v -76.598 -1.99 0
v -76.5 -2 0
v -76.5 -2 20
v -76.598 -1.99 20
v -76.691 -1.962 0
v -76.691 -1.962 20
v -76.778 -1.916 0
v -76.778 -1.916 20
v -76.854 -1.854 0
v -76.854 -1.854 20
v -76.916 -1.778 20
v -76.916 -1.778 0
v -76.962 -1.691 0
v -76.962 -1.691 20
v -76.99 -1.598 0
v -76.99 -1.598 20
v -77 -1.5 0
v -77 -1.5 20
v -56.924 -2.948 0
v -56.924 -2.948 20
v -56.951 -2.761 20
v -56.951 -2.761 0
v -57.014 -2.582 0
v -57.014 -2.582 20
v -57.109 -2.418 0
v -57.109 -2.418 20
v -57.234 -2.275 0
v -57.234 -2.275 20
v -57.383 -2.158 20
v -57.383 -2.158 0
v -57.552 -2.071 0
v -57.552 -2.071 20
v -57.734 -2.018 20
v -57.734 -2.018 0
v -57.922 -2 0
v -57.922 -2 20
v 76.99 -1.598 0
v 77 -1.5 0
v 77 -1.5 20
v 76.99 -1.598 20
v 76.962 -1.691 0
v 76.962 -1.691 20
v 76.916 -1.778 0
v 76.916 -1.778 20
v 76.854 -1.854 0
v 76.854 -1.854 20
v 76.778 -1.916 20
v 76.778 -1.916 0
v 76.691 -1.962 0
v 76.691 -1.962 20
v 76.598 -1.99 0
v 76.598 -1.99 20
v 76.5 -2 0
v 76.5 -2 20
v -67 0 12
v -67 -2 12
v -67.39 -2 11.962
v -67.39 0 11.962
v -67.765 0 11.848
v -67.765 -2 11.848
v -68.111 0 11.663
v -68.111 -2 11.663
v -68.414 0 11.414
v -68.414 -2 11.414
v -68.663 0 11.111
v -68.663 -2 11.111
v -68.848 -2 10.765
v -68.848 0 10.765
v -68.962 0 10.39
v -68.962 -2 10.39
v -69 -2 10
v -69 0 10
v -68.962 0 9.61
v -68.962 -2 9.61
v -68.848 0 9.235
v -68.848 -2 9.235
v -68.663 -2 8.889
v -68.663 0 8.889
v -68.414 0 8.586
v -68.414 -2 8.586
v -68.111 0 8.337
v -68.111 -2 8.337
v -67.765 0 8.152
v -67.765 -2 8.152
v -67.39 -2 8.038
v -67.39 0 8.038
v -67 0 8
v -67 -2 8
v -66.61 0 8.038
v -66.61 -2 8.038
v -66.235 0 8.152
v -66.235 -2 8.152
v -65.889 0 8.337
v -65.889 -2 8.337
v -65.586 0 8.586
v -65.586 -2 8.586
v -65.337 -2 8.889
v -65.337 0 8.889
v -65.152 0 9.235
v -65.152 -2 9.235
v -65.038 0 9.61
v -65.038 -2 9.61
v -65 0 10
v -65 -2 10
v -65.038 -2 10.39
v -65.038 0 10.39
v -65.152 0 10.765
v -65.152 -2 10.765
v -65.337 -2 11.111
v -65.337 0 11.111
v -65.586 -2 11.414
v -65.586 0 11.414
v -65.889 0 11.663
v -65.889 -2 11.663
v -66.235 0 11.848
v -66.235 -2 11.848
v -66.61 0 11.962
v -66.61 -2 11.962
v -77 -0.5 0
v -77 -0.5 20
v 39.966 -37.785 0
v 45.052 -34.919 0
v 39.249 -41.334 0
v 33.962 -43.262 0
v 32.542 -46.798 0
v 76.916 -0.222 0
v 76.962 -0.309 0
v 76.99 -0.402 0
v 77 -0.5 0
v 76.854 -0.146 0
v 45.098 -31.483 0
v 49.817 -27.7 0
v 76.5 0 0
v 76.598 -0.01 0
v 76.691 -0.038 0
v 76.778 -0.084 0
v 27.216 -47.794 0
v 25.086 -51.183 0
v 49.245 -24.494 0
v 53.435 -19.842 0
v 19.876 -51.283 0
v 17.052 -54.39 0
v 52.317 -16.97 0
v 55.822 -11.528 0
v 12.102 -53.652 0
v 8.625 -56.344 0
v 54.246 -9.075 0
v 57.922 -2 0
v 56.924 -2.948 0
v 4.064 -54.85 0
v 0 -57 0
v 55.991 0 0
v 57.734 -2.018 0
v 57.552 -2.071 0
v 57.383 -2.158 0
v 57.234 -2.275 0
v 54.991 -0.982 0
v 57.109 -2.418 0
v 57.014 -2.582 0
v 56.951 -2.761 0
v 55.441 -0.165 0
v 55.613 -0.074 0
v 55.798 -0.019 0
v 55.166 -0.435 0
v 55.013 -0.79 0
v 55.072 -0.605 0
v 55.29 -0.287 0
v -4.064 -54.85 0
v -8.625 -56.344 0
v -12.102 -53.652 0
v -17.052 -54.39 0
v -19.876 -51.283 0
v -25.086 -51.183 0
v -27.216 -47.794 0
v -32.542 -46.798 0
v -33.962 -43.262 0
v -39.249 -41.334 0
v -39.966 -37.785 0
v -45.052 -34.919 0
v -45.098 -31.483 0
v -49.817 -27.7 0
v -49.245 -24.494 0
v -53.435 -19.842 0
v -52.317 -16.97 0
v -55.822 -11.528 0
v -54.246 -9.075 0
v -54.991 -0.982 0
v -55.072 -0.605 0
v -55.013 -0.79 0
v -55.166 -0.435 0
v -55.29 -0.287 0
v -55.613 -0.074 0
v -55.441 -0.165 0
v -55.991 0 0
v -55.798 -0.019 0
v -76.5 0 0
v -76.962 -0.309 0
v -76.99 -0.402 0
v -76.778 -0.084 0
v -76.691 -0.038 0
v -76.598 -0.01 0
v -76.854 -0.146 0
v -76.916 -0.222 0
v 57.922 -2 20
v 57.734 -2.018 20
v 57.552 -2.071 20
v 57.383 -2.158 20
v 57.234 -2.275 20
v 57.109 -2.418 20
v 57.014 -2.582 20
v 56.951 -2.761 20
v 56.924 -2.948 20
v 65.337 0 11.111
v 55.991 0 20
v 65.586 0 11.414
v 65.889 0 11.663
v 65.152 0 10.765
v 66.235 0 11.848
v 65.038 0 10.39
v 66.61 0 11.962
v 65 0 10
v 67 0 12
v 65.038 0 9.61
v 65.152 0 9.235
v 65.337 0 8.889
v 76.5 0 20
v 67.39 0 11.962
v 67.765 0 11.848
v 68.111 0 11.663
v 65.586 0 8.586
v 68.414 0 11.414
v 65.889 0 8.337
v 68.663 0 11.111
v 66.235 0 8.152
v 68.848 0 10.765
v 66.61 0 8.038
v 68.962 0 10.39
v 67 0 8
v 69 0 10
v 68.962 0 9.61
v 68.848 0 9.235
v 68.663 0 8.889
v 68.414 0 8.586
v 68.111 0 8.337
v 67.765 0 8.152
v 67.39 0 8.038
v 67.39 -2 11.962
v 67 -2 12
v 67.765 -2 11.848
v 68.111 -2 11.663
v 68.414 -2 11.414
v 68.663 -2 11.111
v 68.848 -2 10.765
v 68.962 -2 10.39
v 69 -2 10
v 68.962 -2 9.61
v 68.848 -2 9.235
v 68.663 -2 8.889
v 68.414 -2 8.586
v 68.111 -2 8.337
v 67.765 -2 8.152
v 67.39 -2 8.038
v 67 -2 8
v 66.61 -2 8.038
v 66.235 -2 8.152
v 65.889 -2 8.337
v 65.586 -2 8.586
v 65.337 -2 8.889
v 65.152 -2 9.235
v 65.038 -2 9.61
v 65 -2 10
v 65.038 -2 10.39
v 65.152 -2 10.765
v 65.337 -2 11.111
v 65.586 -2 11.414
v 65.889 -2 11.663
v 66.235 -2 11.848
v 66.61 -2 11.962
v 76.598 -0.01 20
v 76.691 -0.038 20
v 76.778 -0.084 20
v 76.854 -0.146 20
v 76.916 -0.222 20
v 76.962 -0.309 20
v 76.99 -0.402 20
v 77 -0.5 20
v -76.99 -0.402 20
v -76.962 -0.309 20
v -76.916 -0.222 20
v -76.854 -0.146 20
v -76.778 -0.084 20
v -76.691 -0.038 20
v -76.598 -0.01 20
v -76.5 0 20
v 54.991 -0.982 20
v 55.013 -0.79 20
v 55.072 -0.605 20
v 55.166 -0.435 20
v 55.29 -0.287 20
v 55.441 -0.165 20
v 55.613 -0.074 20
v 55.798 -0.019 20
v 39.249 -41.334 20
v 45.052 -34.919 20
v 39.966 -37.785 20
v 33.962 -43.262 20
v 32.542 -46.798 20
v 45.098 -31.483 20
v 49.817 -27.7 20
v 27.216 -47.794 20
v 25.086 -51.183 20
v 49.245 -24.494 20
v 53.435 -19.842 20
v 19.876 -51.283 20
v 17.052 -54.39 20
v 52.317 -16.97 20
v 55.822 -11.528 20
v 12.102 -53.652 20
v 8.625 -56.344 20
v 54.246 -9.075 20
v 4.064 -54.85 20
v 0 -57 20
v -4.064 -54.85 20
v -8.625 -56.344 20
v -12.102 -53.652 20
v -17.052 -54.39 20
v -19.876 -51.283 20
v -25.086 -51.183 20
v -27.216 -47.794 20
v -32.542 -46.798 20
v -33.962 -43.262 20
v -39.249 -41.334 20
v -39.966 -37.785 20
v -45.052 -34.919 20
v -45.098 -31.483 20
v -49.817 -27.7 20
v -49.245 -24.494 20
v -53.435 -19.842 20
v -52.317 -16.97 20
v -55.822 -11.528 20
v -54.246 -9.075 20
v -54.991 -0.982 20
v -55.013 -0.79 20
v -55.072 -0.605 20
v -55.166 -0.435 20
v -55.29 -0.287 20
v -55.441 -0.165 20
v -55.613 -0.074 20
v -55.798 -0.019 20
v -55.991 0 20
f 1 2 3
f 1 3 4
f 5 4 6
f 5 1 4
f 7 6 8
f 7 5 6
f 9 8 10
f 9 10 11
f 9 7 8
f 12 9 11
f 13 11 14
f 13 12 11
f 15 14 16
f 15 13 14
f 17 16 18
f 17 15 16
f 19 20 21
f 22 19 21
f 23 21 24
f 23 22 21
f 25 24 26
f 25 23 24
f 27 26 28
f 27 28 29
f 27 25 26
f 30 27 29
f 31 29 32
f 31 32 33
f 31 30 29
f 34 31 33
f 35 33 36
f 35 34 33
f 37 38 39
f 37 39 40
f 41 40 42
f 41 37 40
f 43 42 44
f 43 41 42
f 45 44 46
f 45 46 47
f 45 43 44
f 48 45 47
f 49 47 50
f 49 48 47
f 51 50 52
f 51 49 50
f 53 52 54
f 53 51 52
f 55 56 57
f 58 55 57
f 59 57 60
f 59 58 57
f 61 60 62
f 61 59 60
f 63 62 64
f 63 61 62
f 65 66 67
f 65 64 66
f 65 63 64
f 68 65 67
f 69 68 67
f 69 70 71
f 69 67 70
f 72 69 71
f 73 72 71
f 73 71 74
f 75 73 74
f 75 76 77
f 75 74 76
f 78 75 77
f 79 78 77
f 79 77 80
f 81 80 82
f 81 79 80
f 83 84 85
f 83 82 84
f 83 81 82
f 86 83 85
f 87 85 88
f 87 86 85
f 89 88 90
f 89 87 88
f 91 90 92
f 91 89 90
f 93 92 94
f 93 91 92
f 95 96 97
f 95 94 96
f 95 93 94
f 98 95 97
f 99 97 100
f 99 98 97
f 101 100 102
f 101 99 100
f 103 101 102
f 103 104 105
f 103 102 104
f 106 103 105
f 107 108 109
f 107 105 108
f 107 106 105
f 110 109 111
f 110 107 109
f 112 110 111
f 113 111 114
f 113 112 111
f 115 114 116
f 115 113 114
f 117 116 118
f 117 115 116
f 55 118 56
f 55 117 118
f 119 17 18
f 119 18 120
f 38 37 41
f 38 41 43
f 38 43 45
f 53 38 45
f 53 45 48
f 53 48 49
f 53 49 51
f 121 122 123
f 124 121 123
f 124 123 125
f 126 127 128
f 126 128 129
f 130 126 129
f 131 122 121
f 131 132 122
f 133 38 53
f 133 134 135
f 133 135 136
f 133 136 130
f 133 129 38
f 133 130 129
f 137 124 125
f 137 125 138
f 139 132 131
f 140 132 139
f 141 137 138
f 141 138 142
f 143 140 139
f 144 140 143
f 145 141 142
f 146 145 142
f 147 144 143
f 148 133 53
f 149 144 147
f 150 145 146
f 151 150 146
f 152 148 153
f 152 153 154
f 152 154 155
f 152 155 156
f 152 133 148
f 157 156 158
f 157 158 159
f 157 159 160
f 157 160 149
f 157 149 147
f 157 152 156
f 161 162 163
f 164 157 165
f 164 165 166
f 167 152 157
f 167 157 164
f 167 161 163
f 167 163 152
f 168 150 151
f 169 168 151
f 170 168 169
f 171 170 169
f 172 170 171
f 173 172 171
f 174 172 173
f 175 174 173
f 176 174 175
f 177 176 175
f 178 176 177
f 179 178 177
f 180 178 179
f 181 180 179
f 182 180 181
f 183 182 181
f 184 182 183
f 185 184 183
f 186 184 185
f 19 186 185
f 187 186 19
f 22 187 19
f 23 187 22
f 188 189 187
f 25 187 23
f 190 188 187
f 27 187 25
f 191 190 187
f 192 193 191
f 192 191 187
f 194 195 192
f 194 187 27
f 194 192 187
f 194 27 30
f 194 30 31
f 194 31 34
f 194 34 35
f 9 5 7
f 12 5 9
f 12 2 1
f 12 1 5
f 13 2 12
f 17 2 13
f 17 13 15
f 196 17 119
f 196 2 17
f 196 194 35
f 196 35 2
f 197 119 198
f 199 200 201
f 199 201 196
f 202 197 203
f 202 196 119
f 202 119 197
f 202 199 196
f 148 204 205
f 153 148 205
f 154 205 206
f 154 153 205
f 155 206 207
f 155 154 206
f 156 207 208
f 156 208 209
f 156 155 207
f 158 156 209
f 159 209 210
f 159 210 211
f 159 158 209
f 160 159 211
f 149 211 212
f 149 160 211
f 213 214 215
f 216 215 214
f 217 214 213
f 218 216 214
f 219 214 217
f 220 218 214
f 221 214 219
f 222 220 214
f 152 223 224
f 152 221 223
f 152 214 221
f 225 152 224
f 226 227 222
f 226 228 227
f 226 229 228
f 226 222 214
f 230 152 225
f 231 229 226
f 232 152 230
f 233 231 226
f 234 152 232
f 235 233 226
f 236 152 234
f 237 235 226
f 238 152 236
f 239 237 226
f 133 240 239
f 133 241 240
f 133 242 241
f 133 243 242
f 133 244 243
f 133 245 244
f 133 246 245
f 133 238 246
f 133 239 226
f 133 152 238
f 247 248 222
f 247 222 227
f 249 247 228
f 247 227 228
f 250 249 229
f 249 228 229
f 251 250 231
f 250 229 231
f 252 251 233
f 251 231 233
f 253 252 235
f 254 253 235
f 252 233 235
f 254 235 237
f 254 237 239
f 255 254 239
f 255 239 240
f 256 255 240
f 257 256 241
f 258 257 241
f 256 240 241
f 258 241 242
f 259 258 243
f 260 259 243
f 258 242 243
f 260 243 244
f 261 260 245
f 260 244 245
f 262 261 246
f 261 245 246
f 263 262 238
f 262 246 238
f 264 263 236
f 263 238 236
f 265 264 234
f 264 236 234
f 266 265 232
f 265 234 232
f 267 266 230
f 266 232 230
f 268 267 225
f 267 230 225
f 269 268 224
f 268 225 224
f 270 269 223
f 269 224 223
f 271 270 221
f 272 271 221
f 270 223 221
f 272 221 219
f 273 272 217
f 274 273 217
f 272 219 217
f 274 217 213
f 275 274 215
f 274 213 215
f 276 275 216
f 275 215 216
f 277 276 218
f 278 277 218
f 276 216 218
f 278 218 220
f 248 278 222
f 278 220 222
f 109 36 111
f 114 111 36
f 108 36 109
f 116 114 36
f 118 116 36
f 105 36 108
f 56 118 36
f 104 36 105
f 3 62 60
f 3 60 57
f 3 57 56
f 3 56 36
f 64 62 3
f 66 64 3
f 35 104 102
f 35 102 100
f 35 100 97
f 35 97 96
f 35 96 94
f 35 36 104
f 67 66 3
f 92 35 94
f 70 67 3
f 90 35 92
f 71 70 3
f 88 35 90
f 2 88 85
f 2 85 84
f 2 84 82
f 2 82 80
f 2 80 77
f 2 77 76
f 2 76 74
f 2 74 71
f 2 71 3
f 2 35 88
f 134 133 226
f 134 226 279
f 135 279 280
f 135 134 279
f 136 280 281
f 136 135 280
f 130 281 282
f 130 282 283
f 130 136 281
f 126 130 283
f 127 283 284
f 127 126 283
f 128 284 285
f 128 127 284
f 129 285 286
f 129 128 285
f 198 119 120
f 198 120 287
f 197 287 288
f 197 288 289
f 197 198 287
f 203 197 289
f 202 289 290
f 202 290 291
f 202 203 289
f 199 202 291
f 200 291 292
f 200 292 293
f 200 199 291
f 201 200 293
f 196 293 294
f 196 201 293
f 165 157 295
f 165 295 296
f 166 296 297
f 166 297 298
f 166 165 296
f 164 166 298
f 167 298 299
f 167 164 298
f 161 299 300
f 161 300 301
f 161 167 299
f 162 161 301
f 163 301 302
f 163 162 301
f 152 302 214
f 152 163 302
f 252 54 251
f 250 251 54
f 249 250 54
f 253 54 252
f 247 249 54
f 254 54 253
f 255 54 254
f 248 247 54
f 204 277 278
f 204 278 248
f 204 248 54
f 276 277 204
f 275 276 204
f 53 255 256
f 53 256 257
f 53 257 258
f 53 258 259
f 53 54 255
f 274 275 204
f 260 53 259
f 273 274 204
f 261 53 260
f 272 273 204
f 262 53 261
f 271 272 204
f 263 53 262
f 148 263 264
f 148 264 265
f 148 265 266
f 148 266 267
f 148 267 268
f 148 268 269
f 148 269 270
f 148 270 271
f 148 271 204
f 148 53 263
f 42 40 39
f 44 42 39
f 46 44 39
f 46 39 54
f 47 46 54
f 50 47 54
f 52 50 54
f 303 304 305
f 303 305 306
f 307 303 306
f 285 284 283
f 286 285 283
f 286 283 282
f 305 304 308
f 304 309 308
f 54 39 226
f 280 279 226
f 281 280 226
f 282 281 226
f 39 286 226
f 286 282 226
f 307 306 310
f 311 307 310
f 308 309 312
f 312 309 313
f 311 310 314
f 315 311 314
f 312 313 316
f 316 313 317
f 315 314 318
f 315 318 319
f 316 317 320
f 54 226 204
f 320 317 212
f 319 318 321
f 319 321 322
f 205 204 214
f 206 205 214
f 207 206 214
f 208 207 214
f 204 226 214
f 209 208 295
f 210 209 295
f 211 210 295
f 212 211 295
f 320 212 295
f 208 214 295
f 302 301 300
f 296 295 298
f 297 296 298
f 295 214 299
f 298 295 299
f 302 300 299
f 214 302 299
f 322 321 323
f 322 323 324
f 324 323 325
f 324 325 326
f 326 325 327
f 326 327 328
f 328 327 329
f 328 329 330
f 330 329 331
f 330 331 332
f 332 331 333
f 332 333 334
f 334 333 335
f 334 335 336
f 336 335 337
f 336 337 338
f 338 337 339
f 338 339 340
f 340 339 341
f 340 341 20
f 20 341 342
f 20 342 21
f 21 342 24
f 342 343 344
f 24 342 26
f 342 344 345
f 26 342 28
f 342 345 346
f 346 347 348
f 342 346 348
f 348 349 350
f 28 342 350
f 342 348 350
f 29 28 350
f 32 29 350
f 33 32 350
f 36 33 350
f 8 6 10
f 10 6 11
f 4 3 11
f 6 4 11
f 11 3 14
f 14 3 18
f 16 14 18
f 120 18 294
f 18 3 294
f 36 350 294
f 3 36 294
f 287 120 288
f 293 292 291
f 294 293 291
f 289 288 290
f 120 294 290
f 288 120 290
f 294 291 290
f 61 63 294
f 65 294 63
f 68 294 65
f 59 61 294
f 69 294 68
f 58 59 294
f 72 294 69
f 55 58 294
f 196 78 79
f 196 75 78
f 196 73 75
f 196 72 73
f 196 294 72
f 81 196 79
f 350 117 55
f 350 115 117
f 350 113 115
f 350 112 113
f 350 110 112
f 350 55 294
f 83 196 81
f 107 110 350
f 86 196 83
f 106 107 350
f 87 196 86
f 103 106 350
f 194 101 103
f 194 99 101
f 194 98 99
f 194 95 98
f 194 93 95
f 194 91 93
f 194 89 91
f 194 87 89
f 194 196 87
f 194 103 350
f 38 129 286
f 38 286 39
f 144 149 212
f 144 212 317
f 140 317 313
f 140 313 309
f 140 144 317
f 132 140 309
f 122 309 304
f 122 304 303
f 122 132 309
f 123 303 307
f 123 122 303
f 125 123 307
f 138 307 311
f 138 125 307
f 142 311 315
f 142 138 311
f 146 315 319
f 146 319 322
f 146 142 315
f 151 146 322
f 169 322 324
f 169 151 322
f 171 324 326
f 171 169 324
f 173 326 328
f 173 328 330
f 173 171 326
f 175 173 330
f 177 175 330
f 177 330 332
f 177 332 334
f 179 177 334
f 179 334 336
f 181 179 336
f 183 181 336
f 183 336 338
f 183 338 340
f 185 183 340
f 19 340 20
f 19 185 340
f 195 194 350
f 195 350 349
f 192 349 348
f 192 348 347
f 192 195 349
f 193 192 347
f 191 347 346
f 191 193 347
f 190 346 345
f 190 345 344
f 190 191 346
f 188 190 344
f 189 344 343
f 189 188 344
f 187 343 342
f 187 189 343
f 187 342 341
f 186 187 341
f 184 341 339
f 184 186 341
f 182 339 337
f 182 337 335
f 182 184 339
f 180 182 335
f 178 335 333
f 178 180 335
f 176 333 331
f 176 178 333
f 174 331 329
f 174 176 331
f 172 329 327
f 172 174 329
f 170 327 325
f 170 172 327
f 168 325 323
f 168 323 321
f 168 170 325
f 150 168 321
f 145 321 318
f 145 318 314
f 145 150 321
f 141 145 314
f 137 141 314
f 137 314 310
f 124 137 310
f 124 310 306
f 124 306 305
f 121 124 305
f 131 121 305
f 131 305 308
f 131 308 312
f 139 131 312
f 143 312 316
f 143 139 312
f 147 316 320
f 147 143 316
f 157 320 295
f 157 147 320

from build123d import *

# Parameters (mm, degrees)
SALIENTE_EXTRUIR2_DEPTH = 20
CROQUIS5_R              = 2
CORTAR_EXTRUIR2_DEPTH   = 98.867257037


with BuildPart() as part:
    # Croquis1 → Saliente-Extruir2 (new body)
    with BuildSketch(Plane.XY):
        with BuildLine():
            Line((-57, 0), (-55.991070717, 0))
            ThreePointArc((-55.991070717, 0), (-55.290305828, -0.286607702), (-54.991230168, -0.982142857))
            ThreePointArc((-54.991230168, -0.982142857), (0, -55), (54.991230168, -0.982142857))
            ThreePointArc((54.991230168, -0.982142857), (55.290305828, -0.286607702), (55.991070717, 0))
            Line((55.991070717, 0), (57, 0))
            Line((57, 0), (76.5, 0))
            ThreePointArc((76.5, 0), (76.853553391, -0.146446609), (77, -0.5))
            Line((77, -0.5), (77, -1.5))
            ThreePointArc((77, -1.5), (76.853553391, -1.853553391), (76.5, -2))
            Line((76.5, -2), (57.92236183, -2))
            ThreePointArc((57.92236183, -2), (57.233785087, -2.274836523), (56.923700419, -2.948275862))
            ThreePointArc((56.923700419, -2.948275862), (0, -57), (-56.923700419, -2.948275862))
            ThreePointArc((-56.923700419, -2.948275862), (-57.233785087, -2.274836523), (-57.92236183, -2))
            Line((-57.92236183, -2), (-76.5, -2))
            ThreePointArc((-76.5, -2), (-76.853553391, -1.853553391), (-77, -1.5))
            Line((-77, -1.5), (-77, -0.5))
            ThreePointArc((-77, -0.5), (-76.853553391, -0.146446609), (-76.5, 0))
            Line((-76.5, 0), (-57, 0))
        make_face()
    extrude(amount=SALIENTE_EXTRUIR2_DEPTH)

    # Croquis5 → Cortar-Extruir2 (cut, symmetric)
    with BuildSketch(Plane(origin=(0, 0, 0), x_dir=(1, 0, 0), z_dir=(0, 1, 0))):
        with Locations(Location((67, -10, 0), (0, 0, 270))):
            Circle(CROQUIS5_R)
    cortar_extruir2 = extrude(amount=CORTAR_EXTRUIR2_DEPTH, both=True, mode=Mode.SUBTRACT)

    # Simetría4: Cortar-Extruir2 across plane
    add(cortar_extruir2.mirror(Plane(origin=(0, 0, 0), x_dir=(0, 0, 1), z_dir=(1, 0, 0))), mode=Mode.SUBTRACT)


solid = part.part
